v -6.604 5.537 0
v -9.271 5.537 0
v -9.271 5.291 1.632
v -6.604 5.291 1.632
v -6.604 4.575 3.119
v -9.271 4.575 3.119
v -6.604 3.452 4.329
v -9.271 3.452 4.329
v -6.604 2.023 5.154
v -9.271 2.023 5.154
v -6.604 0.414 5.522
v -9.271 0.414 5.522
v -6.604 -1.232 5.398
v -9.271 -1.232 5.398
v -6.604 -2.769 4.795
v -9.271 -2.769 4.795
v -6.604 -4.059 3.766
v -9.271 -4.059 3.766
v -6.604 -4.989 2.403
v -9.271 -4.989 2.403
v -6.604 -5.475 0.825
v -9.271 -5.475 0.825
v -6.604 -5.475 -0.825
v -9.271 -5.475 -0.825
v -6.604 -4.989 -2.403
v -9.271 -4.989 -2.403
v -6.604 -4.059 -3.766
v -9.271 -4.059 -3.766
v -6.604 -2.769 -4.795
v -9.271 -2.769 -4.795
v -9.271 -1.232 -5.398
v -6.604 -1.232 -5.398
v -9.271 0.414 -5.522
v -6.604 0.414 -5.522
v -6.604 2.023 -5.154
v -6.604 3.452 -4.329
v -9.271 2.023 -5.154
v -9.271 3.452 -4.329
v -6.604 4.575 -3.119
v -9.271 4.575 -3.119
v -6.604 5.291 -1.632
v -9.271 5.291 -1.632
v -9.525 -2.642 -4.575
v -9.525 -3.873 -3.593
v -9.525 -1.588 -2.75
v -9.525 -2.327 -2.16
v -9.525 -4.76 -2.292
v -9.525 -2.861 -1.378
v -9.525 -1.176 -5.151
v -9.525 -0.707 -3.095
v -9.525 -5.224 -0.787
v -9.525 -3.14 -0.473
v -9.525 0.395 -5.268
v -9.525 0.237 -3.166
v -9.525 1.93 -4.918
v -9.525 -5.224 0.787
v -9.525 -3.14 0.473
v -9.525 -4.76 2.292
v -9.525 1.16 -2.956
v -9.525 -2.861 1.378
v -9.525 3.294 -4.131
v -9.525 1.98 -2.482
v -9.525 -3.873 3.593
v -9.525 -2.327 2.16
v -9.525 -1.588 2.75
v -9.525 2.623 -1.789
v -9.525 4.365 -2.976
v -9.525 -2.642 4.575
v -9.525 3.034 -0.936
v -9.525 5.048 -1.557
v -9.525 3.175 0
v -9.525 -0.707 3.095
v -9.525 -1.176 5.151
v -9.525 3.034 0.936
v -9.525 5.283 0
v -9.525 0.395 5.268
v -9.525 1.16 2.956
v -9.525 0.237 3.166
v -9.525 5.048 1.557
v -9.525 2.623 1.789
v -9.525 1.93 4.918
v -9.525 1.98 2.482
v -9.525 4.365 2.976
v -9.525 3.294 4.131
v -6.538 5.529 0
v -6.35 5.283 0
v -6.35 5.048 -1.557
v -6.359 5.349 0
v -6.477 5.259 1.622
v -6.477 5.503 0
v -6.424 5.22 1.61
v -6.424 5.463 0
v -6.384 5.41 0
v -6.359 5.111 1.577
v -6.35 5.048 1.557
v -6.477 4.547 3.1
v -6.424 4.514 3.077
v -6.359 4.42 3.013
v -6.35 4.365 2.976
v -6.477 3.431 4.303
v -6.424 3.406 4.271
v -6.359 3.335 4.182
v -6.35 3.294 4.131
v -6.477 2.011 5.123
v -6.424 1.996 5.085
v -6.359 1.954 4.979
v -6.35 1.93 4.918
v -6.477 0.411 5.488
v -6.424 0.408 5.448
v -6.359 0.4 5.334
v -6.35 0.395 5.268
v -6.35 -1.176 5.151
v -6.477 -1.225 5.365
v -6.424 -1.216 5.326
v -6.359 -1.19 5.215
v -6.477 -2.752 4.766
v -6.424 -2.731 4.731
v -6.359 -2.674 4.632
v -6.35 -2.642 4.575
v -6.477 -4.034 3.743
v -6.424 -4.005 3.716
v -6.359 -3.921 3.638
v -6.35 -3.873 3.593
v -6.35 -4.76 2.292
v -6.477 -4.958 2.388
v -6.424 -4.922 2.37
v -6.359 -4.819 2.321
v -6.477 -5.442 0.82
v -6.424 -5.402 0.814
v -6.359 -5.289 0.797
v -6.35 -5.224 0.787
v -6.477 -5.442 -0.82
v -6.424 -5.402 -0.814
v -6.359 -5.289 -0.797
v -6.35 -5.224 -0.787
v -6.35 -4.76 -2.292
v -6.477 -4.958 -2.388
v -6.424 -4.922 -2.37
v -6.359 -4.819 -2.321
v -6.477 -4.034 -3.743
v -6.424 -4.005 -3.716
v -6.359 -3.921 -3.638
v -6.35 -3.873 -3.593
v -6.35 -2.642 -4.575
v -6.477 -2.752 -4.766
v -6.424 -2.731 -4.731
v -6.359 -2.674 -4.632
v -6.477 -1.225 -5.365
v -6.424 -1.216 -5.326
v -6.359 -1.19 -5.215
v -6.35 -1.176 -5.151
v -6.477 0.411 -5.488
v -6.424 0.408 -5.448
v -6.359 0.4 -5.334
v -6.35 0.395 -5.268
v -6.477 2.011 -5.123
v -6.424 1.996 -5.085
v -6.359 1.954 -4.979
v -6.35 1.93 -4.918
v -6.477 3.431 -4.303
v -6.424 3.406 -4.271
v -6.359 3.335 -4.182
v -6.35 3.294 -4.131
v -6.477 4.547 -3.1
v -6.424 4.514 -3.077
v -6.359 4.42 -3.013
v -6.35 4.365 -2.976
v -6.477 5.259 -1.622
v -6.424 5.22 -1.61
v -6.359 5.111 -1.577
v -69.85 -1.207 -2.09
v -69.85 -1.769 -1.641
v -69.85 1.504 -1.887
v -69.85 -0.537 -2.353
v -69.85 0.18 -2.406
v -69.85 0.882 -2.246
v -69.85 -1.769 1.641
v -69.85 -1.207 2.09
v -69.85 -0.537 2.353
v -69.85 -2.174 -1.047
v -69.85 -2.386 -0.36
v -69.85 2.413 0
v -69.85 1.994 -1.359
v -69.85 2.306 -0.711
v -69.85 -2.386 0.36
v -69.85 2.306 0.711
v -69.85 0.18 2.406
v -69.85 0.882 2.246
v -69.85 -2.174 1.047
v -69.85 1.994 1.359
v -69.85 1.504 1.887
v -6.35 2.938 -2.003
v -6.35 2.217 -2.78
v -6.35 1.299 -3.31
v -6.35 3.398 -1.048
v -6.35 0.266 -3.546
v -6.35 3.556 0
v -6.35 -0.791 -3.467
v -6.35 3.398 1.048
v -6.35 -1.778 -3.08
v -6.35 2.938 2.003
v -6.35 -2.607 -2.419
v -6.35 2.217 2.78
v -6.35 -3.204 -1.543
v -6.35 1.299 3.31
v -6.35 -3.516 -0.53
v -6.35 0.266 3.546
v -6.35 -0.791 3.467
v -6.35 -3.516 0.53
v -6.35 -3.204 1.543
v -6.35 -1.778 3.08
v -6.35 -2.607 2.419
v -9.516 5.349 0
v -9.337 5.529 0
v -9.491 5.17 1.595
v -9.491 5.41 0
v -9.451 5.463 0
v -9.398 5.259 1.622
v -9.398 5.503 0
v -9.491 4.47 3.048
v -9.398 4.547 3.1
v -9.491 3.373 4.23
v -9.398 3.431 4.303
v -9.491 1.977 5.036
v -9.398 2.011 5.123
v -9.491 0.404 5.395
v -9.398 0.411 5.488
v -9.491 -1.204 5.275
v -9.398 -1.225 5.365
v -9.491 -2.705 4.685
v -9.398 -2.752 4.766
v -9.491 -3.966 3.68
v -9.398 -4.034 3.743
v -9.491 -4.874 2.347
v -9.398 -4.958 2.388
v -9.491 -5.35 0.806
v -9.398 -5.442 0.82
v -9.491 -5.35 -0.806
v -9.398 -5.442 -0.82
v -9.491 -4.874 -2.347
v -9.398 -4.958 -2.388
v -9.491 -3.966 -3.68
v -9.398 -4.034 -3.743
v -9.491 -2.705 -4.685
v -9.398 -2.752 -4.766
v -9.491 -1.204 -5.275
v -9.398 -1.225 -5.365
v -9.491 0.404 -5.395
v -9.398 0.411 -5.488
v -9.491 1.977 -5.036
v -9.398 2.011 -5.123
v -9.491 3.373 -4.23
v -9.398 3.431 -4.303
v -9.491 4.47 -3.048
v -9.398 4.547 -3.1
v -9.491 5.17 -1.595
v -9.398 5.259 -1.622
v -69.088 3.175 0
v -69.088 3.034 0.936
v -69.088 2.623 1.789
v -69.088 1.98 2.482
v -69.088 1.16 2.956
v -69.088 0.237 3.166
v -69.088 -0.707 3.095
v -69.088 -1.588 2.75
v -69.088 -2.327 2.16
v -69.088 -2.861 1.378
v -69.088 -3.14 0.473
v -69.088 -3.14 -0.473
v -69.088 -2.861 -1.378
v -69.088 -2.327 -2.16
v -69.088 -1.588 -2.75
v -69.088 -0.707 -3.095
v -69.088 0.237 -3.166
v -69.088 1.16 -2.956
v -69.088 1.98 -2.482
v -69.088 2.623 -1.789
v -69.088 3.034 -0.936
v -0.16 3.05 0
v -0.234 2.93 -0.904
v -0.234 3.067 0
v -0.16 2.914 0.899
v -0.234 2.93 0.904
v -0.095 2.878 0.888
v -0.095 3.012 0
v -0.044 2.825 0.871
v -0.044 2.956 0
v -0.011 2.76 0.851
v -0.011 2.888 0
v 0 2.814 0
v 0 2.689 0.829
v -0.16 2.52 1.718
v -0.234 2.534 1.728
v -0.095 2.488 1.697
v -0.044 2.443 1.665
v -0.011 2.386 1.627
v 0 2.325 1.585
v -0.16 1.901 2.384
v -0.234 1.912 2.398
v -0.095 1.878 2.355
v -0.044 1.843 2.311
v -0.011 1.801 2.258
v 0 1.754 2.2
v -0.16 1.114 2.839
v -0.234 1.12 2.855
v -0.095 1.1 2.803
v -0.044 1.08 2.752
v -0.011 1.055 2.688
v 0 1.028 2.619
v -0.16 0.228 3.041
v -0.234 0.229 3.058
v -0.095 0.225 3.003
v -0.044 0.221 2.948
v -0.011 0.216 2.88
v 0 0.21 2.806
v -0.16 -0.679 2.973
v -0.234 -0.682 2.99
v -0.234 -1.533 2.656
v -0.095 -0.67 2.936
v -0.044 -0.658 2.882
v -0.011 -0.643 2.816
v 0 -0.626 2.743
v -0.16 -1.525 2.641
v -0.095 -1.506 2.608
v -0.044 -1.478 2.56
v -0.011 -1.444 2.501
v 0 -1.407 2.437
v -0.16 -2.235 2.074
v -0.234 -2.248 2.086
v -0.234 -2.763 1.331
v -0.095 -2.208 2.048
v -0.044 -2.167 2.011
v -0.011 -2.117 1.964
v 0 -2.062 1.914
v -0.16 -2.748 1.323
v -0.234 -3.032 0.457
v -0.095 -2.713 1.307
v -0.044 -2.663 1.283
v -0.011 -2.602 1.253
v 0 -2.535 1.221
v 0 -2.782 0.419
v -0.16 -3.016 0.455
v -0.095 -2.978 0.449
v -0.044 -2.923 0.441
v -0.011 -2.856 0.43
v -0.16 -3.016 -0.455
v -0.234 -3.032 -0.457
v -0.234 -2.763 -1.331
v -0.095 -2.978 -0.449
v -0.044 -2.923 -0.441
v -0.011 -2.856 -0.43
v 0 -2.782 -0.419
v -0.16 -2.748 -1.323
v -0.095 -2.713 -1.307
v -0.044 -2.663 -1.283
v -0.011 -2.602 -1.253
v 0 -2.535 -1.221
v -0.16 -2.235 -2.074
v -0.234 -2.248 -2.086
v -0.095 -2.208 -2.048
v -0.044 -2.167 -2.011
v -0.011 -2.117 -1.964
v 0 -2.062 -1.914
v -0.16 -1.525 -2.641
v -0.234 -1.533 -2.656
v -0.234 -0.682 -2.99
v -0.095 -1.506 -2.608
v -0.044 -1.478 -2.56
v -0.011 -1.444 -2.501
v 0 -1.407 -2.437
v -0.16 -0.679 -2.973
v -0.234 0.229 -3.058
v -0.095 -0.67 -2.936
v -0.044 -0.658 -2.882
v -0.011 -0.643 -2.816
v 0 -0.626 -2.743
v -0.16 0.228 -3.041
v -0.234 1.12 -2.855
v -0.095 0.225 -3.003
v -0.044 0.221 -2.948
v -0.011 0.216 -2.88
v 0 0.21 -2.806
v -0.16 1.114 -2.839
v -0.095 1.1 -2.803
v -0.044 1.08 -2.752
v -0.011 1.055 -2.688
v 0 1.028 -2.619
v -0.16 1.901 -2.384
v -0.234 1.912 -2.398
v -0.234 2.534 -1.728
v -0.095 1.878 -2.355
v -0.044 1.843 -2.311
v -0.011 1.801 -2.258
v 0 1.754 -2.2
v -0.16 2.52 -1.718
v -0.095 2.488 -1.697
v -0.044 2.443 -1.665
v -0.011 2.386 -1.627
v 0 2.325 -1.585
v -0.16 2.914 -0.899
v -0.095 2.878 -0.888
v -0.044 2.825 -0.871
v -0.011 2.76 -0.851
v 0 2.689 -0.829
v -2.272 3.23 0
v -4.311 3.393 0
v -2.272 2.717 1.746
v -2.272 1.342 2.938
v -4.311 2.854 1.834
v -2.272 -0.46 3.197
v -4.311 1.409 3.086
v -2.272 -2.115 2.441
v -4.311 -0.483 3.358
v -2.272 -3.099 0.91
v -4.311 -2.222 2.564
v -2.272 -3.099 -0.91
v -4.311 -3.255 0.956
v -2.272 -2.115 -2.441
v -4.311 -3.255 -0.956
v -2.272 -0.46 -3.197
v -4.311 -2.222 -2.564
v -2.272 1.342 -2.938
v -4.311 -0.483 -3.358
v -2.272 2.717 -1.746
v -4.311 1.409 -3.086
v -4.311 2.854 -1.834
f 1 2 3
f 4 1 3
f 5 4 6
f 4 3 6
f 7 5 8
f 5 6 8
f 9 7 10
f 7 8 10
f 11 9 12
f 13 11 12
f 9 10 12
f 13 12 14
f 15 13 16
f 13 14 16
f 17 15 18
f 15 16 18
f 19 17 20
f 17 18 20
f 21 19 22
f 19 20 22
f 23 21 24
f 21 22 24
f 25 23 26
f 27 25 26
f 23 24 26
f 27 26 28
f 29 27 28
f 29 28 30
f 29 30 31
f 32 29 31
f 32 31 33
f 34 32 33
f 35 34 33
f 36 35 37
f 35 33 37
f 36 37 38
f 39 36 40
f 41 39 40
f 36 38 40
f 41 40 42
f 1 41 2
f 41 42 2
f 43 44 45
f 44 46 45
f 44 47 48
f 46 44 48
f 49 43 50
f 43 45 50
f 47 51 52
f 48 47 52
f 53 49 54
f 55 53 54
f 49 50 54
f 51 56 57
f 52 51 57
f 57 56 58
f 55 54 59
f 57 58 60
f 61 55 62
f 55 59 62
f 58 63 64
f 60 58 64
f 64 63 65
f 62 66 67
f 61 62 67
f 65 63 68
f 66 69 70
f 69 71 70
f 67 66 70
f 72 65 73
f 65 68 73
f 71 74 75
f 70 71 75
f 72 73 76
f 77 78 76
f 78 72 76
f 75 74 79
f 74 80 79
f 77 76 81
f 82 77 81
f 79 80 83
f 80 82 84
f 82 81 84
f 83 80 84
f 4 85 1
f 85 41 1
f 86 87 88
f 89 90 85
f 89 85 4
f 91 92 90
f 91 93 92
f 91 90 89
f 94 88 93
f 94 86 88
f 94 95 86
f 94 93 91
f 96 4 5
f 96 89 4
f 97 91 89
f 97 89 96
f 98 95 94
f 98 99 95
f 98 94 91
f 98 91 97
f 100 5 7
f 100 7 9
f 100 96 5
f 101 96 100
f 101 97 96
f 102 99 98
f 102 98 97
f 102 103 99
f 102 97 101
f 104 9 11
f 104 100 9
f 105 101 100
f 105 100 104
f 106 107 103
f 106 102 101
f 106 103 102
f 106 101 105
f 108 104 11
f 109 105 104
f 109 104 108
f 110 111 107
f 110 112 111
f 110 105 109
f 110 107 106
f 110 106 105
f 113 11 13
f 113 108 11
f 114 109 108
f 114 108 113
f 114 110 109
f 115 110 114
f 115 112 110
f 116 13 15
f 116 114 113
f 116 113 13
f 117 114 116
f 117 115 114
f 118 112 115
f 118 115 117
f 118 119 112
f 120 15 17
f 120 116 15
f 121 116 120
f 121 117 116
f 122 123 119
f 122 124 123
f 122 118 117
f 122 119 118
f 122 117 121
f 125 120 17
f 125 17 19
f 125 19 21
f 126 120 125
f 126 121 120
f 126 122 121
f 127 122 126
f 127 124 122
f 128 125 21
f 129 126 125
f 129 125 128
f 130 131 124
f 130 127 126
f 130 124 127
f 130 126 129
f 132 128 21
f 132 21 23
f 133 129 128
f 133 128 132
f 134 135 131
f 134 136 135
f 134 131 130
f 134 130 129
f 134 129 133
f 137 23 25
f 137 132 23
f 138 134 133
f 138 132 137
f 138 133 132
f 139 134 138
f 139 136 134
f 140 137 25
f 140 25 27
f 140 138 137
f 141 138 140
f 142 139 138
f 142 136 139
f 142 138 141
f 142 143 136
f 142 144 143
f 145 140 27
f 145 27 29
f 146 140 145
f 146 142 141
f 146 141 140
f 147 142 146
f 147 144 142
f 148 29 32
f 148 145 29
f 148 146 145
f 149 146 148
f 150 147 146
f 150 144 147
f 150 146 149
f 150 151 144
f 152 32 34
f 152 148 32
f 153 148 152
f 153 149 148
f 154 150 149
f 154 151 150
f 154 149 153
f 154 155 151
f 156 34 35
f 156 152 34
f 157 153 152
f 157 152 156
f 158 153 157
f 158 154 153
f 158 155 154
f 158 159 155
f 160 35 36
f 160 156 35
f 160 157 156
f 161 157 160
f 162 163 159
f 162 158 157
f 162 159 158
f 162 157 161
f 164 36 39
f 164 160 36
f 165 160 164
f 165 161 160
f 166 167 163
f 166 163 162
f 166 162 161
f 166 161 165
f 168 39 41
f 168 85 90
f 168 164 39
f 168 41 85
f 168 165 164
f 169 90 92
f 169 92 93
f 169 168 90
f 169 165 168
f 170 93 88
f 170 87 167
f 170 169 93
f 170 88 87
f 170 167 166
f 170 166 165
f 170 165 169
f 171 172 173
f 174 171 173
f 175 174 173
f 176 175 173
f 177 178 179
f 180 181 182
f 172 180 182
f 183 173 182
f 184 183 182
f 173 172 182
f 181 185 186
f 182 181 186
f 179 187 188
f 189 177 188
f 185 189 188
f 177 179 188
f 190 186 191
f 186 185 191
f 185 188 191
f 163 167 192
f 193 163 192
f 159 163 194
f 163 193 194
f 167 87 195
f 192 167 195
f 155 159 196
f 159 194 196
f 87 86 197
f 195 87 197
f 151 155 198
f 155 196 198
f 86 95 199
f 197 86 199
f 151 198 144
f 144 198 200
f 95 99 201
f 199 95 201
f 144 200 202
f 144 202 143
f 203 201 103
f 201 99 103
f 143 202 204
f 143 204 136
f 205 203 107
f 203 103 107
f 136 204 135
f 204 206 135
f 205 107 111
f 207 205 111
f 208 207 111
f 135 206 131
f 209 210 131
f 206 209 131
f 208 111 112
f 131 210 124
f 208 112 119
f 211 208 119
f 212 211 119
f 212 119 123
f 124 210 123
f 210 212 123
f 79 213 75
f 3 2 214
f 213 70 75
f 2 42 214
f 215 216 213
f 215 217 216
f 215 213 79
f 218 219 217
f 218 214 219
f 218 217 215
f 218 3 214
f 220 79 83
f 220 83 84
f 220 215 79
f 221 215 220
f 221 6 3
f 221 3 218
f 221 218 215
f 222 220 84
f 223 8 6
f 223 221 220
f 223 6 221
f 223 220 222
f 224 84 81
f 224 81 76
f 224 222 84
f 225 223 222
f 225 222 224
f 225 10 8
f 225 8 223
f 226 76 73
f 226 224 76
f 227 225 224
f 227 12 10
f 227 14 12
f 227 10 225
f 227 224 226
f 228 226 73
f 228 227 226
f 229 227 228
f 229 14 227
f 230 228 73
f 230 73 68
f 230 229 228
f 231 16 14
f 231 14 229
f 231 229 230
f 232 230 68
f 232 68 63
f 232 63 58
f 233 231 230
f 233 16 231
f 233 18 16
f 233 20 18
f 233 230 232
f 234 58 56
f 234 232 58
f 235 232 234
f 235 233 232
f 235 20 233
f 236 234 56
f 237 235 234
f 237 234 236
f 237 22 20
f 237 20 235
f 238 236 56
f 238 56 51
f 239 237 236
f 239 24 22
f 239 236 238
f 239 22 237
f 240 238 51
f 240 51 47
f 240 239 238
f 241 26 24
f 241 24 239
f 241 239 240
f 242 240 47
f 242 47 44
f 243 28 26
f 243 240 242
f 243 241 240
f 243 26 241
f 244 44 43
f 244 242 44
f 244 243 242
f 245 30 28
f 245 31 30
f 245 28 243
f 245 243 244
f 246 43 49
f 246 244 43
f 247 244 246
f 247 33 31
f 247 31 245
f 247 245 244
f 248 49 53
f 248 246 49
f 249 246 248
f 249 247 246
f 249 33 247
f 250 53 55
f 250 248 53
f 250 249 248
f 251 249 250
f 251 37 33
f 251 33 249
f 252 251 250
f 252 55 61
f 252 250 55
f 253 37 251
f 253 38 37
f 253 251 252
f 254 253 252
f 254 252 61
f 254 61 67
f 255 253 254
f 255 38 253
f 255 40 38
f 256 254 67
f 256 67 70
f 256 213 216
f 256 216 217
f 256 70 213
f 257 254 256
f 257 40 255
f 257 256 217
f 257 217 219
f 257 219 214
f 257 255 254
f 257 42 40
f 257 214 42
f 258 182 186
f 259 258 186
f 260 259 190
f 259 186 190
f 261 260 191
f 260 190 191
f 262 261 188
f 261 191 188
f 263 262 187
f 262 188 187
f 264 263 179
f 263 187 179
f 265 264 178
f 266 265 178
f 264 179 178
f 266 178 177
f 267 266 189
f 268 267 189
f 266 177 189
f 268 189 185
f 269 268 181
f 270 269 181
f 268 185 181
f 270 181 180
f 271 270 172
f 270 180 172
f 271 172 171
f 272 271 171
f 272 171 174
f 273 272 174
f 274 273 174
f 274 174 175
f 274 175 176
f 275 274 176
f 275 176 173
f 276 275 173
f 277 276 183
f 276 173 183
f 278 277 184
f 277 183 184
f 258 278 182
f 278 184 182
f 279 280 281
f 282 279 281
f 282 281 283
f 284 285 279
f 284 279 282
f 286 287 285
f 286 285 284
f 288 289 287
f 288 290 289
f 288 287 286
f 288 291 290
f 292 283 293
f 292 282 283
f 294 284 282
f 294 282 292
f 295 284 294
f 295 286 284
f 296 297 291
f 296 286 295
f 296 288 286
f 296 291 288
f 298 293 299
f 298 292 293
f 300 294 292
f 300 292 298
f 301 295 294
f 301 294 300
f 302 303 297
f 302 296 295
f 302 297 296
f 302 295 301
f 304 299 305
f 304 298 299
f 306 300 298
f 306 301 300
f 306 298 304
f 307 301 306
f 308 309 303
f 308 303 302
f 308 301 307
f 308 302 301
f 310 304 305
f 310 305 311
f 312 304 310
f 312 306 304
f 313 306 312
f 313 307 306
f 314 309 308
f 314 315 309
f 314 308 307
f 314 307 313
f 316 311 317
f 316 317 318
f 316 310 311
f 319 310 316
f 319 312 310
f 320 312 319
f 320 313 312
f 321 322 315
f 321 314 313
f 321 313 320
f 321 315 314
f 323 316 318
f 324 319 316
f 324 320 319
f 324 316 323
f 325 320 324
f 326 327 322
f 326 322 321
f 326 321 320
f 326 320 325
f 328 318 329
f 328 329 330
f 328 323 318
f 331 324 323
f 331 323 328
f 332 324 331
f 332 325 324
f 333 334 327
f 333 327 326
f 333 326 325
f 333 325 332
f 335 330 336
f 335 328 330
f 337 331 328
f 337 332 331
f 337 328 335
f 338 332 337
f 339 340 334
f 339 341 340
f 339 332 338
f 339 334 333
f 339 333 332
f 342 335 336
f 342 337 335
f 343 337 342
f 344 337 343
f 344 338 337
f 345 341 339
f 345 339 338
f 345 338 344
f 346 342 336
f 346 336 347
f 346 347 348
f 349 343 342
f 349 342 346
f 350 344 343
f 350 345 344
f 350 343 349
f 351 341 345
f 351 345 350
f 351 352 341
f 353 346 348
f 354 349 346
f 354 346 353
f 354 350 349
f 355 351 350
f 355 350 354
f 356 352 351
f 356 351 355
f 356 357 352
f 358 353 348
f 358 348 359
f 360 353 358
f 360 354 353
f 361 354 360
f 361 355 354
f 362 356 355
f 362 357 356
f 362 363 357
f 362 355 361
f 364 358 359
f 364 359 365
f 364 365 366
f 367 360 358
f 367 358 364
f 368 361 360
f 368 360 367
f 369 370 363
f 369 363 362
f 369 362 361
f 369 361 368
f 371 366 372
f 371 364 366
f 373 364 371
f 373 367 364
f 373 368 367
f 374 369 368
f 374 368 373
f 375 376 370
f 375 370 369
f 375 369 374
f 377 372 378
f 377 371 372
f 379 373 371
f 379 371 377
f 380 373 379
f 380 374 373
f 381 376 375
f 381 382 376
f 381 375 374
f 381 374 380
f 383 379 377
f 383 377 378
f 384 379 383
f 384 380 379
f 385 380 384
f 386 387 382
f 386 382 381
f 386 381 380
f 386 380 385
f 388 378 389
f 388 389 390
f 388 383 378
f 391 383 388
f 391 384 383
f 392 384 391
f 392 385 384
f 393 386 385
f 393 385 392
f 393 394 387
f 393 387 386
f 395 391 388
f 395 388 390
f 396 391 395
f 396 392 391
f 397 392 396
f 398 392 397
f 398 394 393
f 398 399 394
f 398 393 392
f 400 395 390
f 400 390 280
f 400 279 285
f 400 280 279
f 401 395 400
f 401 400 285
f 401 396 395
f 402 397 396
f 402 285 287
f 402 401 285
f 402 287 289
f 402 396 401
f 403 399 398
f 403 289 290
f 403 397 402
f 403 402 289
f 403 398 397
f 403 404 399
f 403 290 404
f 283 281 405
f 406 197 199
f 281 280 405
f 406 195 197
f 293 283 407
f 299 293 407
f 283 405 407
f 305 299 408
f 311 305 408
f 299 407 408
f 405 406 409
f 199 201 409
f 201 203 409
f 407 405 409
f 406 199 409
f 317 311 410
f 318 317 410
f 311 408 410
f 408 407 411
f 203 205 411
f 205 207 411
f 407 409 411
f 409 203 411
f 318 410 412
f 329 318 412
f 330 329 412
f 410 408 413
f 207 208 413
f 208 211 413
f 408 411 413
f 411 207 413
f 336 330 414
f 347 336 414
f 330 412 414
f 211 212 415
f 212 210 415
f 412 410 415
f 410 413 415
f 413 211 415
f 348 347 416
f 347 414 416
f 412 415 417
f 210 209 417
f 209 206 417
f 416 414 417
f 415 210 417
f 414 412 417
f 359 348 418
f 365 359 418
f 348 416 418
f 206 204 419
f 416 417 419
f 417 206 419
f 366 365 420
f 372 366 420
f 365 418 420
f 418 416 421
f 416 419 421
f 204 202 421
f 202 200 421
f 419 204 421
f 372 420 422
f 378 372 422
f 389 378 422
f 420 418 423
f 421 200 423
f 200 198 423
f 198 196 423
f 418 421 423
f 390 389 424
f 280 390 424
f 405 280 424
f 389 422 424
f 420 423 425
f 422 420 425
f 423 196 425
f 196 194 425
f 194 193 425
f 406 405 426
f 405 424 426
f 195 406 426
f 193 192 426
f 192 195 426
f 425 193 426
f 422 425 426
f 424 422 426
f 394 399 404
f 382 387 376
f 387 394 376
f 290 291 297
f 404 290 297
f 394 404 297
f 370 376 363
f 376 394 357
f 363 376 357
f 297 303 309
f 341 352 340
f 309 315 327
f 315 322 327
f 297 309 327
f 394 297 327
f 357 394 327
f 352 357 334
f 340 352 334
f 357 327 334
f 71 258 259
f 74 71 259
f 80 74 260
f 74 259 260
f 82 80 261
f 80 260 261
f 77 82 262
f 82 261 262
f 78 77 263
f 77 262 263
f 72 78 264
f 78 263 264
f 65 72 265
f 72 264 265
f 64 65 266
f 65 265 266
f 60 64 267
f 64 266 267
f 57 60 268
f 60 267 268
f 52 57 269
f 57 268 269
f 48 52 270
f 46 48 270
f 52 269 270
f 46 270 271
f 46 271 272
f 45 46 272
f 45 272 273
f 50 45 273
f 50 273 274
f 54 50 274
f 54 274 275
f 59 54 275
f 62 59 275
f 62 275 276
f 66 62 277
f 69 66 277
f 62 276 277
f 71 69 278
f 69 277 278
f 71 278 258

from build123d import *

# Parameters (mm, degrees)
F2_SIZE = 0.762
F3_R    = 0.254


with BuildPart() as f1:
    # F0 (on Top) → F1 (revolve)
    with BuildSketch(Plane.XY):
        Polygon((-69.85, 0), (0, 0), (0, 3.048), (-6.35, 3.556), (-6.35, 5.5372), (-9.525, 5.5372), (-9.525, 3.175), (-69.85, 3.175), align=None)
    revolve(axis=Axis((-34.925, 0, 0), (1, 0, 0)))

    # F2
    f2_edges = [f1.edges().sort_by_distance(p)[0] for p in [
        (-69.85, -3.175, 0),
    ]]
    chamfer(f2_edges, length=F2_SIZE)

    # F3
    f3_edges = [f1.edges().sort_by_distance(p)[0] for p in [
        (-9.525, -5.5372, 0),
        (-6.35, -5.5372, 0),
        (0, -3.048, 0),
    ]]
    fillet(f3_edges, radius=F3_R)


solid = f1.part
